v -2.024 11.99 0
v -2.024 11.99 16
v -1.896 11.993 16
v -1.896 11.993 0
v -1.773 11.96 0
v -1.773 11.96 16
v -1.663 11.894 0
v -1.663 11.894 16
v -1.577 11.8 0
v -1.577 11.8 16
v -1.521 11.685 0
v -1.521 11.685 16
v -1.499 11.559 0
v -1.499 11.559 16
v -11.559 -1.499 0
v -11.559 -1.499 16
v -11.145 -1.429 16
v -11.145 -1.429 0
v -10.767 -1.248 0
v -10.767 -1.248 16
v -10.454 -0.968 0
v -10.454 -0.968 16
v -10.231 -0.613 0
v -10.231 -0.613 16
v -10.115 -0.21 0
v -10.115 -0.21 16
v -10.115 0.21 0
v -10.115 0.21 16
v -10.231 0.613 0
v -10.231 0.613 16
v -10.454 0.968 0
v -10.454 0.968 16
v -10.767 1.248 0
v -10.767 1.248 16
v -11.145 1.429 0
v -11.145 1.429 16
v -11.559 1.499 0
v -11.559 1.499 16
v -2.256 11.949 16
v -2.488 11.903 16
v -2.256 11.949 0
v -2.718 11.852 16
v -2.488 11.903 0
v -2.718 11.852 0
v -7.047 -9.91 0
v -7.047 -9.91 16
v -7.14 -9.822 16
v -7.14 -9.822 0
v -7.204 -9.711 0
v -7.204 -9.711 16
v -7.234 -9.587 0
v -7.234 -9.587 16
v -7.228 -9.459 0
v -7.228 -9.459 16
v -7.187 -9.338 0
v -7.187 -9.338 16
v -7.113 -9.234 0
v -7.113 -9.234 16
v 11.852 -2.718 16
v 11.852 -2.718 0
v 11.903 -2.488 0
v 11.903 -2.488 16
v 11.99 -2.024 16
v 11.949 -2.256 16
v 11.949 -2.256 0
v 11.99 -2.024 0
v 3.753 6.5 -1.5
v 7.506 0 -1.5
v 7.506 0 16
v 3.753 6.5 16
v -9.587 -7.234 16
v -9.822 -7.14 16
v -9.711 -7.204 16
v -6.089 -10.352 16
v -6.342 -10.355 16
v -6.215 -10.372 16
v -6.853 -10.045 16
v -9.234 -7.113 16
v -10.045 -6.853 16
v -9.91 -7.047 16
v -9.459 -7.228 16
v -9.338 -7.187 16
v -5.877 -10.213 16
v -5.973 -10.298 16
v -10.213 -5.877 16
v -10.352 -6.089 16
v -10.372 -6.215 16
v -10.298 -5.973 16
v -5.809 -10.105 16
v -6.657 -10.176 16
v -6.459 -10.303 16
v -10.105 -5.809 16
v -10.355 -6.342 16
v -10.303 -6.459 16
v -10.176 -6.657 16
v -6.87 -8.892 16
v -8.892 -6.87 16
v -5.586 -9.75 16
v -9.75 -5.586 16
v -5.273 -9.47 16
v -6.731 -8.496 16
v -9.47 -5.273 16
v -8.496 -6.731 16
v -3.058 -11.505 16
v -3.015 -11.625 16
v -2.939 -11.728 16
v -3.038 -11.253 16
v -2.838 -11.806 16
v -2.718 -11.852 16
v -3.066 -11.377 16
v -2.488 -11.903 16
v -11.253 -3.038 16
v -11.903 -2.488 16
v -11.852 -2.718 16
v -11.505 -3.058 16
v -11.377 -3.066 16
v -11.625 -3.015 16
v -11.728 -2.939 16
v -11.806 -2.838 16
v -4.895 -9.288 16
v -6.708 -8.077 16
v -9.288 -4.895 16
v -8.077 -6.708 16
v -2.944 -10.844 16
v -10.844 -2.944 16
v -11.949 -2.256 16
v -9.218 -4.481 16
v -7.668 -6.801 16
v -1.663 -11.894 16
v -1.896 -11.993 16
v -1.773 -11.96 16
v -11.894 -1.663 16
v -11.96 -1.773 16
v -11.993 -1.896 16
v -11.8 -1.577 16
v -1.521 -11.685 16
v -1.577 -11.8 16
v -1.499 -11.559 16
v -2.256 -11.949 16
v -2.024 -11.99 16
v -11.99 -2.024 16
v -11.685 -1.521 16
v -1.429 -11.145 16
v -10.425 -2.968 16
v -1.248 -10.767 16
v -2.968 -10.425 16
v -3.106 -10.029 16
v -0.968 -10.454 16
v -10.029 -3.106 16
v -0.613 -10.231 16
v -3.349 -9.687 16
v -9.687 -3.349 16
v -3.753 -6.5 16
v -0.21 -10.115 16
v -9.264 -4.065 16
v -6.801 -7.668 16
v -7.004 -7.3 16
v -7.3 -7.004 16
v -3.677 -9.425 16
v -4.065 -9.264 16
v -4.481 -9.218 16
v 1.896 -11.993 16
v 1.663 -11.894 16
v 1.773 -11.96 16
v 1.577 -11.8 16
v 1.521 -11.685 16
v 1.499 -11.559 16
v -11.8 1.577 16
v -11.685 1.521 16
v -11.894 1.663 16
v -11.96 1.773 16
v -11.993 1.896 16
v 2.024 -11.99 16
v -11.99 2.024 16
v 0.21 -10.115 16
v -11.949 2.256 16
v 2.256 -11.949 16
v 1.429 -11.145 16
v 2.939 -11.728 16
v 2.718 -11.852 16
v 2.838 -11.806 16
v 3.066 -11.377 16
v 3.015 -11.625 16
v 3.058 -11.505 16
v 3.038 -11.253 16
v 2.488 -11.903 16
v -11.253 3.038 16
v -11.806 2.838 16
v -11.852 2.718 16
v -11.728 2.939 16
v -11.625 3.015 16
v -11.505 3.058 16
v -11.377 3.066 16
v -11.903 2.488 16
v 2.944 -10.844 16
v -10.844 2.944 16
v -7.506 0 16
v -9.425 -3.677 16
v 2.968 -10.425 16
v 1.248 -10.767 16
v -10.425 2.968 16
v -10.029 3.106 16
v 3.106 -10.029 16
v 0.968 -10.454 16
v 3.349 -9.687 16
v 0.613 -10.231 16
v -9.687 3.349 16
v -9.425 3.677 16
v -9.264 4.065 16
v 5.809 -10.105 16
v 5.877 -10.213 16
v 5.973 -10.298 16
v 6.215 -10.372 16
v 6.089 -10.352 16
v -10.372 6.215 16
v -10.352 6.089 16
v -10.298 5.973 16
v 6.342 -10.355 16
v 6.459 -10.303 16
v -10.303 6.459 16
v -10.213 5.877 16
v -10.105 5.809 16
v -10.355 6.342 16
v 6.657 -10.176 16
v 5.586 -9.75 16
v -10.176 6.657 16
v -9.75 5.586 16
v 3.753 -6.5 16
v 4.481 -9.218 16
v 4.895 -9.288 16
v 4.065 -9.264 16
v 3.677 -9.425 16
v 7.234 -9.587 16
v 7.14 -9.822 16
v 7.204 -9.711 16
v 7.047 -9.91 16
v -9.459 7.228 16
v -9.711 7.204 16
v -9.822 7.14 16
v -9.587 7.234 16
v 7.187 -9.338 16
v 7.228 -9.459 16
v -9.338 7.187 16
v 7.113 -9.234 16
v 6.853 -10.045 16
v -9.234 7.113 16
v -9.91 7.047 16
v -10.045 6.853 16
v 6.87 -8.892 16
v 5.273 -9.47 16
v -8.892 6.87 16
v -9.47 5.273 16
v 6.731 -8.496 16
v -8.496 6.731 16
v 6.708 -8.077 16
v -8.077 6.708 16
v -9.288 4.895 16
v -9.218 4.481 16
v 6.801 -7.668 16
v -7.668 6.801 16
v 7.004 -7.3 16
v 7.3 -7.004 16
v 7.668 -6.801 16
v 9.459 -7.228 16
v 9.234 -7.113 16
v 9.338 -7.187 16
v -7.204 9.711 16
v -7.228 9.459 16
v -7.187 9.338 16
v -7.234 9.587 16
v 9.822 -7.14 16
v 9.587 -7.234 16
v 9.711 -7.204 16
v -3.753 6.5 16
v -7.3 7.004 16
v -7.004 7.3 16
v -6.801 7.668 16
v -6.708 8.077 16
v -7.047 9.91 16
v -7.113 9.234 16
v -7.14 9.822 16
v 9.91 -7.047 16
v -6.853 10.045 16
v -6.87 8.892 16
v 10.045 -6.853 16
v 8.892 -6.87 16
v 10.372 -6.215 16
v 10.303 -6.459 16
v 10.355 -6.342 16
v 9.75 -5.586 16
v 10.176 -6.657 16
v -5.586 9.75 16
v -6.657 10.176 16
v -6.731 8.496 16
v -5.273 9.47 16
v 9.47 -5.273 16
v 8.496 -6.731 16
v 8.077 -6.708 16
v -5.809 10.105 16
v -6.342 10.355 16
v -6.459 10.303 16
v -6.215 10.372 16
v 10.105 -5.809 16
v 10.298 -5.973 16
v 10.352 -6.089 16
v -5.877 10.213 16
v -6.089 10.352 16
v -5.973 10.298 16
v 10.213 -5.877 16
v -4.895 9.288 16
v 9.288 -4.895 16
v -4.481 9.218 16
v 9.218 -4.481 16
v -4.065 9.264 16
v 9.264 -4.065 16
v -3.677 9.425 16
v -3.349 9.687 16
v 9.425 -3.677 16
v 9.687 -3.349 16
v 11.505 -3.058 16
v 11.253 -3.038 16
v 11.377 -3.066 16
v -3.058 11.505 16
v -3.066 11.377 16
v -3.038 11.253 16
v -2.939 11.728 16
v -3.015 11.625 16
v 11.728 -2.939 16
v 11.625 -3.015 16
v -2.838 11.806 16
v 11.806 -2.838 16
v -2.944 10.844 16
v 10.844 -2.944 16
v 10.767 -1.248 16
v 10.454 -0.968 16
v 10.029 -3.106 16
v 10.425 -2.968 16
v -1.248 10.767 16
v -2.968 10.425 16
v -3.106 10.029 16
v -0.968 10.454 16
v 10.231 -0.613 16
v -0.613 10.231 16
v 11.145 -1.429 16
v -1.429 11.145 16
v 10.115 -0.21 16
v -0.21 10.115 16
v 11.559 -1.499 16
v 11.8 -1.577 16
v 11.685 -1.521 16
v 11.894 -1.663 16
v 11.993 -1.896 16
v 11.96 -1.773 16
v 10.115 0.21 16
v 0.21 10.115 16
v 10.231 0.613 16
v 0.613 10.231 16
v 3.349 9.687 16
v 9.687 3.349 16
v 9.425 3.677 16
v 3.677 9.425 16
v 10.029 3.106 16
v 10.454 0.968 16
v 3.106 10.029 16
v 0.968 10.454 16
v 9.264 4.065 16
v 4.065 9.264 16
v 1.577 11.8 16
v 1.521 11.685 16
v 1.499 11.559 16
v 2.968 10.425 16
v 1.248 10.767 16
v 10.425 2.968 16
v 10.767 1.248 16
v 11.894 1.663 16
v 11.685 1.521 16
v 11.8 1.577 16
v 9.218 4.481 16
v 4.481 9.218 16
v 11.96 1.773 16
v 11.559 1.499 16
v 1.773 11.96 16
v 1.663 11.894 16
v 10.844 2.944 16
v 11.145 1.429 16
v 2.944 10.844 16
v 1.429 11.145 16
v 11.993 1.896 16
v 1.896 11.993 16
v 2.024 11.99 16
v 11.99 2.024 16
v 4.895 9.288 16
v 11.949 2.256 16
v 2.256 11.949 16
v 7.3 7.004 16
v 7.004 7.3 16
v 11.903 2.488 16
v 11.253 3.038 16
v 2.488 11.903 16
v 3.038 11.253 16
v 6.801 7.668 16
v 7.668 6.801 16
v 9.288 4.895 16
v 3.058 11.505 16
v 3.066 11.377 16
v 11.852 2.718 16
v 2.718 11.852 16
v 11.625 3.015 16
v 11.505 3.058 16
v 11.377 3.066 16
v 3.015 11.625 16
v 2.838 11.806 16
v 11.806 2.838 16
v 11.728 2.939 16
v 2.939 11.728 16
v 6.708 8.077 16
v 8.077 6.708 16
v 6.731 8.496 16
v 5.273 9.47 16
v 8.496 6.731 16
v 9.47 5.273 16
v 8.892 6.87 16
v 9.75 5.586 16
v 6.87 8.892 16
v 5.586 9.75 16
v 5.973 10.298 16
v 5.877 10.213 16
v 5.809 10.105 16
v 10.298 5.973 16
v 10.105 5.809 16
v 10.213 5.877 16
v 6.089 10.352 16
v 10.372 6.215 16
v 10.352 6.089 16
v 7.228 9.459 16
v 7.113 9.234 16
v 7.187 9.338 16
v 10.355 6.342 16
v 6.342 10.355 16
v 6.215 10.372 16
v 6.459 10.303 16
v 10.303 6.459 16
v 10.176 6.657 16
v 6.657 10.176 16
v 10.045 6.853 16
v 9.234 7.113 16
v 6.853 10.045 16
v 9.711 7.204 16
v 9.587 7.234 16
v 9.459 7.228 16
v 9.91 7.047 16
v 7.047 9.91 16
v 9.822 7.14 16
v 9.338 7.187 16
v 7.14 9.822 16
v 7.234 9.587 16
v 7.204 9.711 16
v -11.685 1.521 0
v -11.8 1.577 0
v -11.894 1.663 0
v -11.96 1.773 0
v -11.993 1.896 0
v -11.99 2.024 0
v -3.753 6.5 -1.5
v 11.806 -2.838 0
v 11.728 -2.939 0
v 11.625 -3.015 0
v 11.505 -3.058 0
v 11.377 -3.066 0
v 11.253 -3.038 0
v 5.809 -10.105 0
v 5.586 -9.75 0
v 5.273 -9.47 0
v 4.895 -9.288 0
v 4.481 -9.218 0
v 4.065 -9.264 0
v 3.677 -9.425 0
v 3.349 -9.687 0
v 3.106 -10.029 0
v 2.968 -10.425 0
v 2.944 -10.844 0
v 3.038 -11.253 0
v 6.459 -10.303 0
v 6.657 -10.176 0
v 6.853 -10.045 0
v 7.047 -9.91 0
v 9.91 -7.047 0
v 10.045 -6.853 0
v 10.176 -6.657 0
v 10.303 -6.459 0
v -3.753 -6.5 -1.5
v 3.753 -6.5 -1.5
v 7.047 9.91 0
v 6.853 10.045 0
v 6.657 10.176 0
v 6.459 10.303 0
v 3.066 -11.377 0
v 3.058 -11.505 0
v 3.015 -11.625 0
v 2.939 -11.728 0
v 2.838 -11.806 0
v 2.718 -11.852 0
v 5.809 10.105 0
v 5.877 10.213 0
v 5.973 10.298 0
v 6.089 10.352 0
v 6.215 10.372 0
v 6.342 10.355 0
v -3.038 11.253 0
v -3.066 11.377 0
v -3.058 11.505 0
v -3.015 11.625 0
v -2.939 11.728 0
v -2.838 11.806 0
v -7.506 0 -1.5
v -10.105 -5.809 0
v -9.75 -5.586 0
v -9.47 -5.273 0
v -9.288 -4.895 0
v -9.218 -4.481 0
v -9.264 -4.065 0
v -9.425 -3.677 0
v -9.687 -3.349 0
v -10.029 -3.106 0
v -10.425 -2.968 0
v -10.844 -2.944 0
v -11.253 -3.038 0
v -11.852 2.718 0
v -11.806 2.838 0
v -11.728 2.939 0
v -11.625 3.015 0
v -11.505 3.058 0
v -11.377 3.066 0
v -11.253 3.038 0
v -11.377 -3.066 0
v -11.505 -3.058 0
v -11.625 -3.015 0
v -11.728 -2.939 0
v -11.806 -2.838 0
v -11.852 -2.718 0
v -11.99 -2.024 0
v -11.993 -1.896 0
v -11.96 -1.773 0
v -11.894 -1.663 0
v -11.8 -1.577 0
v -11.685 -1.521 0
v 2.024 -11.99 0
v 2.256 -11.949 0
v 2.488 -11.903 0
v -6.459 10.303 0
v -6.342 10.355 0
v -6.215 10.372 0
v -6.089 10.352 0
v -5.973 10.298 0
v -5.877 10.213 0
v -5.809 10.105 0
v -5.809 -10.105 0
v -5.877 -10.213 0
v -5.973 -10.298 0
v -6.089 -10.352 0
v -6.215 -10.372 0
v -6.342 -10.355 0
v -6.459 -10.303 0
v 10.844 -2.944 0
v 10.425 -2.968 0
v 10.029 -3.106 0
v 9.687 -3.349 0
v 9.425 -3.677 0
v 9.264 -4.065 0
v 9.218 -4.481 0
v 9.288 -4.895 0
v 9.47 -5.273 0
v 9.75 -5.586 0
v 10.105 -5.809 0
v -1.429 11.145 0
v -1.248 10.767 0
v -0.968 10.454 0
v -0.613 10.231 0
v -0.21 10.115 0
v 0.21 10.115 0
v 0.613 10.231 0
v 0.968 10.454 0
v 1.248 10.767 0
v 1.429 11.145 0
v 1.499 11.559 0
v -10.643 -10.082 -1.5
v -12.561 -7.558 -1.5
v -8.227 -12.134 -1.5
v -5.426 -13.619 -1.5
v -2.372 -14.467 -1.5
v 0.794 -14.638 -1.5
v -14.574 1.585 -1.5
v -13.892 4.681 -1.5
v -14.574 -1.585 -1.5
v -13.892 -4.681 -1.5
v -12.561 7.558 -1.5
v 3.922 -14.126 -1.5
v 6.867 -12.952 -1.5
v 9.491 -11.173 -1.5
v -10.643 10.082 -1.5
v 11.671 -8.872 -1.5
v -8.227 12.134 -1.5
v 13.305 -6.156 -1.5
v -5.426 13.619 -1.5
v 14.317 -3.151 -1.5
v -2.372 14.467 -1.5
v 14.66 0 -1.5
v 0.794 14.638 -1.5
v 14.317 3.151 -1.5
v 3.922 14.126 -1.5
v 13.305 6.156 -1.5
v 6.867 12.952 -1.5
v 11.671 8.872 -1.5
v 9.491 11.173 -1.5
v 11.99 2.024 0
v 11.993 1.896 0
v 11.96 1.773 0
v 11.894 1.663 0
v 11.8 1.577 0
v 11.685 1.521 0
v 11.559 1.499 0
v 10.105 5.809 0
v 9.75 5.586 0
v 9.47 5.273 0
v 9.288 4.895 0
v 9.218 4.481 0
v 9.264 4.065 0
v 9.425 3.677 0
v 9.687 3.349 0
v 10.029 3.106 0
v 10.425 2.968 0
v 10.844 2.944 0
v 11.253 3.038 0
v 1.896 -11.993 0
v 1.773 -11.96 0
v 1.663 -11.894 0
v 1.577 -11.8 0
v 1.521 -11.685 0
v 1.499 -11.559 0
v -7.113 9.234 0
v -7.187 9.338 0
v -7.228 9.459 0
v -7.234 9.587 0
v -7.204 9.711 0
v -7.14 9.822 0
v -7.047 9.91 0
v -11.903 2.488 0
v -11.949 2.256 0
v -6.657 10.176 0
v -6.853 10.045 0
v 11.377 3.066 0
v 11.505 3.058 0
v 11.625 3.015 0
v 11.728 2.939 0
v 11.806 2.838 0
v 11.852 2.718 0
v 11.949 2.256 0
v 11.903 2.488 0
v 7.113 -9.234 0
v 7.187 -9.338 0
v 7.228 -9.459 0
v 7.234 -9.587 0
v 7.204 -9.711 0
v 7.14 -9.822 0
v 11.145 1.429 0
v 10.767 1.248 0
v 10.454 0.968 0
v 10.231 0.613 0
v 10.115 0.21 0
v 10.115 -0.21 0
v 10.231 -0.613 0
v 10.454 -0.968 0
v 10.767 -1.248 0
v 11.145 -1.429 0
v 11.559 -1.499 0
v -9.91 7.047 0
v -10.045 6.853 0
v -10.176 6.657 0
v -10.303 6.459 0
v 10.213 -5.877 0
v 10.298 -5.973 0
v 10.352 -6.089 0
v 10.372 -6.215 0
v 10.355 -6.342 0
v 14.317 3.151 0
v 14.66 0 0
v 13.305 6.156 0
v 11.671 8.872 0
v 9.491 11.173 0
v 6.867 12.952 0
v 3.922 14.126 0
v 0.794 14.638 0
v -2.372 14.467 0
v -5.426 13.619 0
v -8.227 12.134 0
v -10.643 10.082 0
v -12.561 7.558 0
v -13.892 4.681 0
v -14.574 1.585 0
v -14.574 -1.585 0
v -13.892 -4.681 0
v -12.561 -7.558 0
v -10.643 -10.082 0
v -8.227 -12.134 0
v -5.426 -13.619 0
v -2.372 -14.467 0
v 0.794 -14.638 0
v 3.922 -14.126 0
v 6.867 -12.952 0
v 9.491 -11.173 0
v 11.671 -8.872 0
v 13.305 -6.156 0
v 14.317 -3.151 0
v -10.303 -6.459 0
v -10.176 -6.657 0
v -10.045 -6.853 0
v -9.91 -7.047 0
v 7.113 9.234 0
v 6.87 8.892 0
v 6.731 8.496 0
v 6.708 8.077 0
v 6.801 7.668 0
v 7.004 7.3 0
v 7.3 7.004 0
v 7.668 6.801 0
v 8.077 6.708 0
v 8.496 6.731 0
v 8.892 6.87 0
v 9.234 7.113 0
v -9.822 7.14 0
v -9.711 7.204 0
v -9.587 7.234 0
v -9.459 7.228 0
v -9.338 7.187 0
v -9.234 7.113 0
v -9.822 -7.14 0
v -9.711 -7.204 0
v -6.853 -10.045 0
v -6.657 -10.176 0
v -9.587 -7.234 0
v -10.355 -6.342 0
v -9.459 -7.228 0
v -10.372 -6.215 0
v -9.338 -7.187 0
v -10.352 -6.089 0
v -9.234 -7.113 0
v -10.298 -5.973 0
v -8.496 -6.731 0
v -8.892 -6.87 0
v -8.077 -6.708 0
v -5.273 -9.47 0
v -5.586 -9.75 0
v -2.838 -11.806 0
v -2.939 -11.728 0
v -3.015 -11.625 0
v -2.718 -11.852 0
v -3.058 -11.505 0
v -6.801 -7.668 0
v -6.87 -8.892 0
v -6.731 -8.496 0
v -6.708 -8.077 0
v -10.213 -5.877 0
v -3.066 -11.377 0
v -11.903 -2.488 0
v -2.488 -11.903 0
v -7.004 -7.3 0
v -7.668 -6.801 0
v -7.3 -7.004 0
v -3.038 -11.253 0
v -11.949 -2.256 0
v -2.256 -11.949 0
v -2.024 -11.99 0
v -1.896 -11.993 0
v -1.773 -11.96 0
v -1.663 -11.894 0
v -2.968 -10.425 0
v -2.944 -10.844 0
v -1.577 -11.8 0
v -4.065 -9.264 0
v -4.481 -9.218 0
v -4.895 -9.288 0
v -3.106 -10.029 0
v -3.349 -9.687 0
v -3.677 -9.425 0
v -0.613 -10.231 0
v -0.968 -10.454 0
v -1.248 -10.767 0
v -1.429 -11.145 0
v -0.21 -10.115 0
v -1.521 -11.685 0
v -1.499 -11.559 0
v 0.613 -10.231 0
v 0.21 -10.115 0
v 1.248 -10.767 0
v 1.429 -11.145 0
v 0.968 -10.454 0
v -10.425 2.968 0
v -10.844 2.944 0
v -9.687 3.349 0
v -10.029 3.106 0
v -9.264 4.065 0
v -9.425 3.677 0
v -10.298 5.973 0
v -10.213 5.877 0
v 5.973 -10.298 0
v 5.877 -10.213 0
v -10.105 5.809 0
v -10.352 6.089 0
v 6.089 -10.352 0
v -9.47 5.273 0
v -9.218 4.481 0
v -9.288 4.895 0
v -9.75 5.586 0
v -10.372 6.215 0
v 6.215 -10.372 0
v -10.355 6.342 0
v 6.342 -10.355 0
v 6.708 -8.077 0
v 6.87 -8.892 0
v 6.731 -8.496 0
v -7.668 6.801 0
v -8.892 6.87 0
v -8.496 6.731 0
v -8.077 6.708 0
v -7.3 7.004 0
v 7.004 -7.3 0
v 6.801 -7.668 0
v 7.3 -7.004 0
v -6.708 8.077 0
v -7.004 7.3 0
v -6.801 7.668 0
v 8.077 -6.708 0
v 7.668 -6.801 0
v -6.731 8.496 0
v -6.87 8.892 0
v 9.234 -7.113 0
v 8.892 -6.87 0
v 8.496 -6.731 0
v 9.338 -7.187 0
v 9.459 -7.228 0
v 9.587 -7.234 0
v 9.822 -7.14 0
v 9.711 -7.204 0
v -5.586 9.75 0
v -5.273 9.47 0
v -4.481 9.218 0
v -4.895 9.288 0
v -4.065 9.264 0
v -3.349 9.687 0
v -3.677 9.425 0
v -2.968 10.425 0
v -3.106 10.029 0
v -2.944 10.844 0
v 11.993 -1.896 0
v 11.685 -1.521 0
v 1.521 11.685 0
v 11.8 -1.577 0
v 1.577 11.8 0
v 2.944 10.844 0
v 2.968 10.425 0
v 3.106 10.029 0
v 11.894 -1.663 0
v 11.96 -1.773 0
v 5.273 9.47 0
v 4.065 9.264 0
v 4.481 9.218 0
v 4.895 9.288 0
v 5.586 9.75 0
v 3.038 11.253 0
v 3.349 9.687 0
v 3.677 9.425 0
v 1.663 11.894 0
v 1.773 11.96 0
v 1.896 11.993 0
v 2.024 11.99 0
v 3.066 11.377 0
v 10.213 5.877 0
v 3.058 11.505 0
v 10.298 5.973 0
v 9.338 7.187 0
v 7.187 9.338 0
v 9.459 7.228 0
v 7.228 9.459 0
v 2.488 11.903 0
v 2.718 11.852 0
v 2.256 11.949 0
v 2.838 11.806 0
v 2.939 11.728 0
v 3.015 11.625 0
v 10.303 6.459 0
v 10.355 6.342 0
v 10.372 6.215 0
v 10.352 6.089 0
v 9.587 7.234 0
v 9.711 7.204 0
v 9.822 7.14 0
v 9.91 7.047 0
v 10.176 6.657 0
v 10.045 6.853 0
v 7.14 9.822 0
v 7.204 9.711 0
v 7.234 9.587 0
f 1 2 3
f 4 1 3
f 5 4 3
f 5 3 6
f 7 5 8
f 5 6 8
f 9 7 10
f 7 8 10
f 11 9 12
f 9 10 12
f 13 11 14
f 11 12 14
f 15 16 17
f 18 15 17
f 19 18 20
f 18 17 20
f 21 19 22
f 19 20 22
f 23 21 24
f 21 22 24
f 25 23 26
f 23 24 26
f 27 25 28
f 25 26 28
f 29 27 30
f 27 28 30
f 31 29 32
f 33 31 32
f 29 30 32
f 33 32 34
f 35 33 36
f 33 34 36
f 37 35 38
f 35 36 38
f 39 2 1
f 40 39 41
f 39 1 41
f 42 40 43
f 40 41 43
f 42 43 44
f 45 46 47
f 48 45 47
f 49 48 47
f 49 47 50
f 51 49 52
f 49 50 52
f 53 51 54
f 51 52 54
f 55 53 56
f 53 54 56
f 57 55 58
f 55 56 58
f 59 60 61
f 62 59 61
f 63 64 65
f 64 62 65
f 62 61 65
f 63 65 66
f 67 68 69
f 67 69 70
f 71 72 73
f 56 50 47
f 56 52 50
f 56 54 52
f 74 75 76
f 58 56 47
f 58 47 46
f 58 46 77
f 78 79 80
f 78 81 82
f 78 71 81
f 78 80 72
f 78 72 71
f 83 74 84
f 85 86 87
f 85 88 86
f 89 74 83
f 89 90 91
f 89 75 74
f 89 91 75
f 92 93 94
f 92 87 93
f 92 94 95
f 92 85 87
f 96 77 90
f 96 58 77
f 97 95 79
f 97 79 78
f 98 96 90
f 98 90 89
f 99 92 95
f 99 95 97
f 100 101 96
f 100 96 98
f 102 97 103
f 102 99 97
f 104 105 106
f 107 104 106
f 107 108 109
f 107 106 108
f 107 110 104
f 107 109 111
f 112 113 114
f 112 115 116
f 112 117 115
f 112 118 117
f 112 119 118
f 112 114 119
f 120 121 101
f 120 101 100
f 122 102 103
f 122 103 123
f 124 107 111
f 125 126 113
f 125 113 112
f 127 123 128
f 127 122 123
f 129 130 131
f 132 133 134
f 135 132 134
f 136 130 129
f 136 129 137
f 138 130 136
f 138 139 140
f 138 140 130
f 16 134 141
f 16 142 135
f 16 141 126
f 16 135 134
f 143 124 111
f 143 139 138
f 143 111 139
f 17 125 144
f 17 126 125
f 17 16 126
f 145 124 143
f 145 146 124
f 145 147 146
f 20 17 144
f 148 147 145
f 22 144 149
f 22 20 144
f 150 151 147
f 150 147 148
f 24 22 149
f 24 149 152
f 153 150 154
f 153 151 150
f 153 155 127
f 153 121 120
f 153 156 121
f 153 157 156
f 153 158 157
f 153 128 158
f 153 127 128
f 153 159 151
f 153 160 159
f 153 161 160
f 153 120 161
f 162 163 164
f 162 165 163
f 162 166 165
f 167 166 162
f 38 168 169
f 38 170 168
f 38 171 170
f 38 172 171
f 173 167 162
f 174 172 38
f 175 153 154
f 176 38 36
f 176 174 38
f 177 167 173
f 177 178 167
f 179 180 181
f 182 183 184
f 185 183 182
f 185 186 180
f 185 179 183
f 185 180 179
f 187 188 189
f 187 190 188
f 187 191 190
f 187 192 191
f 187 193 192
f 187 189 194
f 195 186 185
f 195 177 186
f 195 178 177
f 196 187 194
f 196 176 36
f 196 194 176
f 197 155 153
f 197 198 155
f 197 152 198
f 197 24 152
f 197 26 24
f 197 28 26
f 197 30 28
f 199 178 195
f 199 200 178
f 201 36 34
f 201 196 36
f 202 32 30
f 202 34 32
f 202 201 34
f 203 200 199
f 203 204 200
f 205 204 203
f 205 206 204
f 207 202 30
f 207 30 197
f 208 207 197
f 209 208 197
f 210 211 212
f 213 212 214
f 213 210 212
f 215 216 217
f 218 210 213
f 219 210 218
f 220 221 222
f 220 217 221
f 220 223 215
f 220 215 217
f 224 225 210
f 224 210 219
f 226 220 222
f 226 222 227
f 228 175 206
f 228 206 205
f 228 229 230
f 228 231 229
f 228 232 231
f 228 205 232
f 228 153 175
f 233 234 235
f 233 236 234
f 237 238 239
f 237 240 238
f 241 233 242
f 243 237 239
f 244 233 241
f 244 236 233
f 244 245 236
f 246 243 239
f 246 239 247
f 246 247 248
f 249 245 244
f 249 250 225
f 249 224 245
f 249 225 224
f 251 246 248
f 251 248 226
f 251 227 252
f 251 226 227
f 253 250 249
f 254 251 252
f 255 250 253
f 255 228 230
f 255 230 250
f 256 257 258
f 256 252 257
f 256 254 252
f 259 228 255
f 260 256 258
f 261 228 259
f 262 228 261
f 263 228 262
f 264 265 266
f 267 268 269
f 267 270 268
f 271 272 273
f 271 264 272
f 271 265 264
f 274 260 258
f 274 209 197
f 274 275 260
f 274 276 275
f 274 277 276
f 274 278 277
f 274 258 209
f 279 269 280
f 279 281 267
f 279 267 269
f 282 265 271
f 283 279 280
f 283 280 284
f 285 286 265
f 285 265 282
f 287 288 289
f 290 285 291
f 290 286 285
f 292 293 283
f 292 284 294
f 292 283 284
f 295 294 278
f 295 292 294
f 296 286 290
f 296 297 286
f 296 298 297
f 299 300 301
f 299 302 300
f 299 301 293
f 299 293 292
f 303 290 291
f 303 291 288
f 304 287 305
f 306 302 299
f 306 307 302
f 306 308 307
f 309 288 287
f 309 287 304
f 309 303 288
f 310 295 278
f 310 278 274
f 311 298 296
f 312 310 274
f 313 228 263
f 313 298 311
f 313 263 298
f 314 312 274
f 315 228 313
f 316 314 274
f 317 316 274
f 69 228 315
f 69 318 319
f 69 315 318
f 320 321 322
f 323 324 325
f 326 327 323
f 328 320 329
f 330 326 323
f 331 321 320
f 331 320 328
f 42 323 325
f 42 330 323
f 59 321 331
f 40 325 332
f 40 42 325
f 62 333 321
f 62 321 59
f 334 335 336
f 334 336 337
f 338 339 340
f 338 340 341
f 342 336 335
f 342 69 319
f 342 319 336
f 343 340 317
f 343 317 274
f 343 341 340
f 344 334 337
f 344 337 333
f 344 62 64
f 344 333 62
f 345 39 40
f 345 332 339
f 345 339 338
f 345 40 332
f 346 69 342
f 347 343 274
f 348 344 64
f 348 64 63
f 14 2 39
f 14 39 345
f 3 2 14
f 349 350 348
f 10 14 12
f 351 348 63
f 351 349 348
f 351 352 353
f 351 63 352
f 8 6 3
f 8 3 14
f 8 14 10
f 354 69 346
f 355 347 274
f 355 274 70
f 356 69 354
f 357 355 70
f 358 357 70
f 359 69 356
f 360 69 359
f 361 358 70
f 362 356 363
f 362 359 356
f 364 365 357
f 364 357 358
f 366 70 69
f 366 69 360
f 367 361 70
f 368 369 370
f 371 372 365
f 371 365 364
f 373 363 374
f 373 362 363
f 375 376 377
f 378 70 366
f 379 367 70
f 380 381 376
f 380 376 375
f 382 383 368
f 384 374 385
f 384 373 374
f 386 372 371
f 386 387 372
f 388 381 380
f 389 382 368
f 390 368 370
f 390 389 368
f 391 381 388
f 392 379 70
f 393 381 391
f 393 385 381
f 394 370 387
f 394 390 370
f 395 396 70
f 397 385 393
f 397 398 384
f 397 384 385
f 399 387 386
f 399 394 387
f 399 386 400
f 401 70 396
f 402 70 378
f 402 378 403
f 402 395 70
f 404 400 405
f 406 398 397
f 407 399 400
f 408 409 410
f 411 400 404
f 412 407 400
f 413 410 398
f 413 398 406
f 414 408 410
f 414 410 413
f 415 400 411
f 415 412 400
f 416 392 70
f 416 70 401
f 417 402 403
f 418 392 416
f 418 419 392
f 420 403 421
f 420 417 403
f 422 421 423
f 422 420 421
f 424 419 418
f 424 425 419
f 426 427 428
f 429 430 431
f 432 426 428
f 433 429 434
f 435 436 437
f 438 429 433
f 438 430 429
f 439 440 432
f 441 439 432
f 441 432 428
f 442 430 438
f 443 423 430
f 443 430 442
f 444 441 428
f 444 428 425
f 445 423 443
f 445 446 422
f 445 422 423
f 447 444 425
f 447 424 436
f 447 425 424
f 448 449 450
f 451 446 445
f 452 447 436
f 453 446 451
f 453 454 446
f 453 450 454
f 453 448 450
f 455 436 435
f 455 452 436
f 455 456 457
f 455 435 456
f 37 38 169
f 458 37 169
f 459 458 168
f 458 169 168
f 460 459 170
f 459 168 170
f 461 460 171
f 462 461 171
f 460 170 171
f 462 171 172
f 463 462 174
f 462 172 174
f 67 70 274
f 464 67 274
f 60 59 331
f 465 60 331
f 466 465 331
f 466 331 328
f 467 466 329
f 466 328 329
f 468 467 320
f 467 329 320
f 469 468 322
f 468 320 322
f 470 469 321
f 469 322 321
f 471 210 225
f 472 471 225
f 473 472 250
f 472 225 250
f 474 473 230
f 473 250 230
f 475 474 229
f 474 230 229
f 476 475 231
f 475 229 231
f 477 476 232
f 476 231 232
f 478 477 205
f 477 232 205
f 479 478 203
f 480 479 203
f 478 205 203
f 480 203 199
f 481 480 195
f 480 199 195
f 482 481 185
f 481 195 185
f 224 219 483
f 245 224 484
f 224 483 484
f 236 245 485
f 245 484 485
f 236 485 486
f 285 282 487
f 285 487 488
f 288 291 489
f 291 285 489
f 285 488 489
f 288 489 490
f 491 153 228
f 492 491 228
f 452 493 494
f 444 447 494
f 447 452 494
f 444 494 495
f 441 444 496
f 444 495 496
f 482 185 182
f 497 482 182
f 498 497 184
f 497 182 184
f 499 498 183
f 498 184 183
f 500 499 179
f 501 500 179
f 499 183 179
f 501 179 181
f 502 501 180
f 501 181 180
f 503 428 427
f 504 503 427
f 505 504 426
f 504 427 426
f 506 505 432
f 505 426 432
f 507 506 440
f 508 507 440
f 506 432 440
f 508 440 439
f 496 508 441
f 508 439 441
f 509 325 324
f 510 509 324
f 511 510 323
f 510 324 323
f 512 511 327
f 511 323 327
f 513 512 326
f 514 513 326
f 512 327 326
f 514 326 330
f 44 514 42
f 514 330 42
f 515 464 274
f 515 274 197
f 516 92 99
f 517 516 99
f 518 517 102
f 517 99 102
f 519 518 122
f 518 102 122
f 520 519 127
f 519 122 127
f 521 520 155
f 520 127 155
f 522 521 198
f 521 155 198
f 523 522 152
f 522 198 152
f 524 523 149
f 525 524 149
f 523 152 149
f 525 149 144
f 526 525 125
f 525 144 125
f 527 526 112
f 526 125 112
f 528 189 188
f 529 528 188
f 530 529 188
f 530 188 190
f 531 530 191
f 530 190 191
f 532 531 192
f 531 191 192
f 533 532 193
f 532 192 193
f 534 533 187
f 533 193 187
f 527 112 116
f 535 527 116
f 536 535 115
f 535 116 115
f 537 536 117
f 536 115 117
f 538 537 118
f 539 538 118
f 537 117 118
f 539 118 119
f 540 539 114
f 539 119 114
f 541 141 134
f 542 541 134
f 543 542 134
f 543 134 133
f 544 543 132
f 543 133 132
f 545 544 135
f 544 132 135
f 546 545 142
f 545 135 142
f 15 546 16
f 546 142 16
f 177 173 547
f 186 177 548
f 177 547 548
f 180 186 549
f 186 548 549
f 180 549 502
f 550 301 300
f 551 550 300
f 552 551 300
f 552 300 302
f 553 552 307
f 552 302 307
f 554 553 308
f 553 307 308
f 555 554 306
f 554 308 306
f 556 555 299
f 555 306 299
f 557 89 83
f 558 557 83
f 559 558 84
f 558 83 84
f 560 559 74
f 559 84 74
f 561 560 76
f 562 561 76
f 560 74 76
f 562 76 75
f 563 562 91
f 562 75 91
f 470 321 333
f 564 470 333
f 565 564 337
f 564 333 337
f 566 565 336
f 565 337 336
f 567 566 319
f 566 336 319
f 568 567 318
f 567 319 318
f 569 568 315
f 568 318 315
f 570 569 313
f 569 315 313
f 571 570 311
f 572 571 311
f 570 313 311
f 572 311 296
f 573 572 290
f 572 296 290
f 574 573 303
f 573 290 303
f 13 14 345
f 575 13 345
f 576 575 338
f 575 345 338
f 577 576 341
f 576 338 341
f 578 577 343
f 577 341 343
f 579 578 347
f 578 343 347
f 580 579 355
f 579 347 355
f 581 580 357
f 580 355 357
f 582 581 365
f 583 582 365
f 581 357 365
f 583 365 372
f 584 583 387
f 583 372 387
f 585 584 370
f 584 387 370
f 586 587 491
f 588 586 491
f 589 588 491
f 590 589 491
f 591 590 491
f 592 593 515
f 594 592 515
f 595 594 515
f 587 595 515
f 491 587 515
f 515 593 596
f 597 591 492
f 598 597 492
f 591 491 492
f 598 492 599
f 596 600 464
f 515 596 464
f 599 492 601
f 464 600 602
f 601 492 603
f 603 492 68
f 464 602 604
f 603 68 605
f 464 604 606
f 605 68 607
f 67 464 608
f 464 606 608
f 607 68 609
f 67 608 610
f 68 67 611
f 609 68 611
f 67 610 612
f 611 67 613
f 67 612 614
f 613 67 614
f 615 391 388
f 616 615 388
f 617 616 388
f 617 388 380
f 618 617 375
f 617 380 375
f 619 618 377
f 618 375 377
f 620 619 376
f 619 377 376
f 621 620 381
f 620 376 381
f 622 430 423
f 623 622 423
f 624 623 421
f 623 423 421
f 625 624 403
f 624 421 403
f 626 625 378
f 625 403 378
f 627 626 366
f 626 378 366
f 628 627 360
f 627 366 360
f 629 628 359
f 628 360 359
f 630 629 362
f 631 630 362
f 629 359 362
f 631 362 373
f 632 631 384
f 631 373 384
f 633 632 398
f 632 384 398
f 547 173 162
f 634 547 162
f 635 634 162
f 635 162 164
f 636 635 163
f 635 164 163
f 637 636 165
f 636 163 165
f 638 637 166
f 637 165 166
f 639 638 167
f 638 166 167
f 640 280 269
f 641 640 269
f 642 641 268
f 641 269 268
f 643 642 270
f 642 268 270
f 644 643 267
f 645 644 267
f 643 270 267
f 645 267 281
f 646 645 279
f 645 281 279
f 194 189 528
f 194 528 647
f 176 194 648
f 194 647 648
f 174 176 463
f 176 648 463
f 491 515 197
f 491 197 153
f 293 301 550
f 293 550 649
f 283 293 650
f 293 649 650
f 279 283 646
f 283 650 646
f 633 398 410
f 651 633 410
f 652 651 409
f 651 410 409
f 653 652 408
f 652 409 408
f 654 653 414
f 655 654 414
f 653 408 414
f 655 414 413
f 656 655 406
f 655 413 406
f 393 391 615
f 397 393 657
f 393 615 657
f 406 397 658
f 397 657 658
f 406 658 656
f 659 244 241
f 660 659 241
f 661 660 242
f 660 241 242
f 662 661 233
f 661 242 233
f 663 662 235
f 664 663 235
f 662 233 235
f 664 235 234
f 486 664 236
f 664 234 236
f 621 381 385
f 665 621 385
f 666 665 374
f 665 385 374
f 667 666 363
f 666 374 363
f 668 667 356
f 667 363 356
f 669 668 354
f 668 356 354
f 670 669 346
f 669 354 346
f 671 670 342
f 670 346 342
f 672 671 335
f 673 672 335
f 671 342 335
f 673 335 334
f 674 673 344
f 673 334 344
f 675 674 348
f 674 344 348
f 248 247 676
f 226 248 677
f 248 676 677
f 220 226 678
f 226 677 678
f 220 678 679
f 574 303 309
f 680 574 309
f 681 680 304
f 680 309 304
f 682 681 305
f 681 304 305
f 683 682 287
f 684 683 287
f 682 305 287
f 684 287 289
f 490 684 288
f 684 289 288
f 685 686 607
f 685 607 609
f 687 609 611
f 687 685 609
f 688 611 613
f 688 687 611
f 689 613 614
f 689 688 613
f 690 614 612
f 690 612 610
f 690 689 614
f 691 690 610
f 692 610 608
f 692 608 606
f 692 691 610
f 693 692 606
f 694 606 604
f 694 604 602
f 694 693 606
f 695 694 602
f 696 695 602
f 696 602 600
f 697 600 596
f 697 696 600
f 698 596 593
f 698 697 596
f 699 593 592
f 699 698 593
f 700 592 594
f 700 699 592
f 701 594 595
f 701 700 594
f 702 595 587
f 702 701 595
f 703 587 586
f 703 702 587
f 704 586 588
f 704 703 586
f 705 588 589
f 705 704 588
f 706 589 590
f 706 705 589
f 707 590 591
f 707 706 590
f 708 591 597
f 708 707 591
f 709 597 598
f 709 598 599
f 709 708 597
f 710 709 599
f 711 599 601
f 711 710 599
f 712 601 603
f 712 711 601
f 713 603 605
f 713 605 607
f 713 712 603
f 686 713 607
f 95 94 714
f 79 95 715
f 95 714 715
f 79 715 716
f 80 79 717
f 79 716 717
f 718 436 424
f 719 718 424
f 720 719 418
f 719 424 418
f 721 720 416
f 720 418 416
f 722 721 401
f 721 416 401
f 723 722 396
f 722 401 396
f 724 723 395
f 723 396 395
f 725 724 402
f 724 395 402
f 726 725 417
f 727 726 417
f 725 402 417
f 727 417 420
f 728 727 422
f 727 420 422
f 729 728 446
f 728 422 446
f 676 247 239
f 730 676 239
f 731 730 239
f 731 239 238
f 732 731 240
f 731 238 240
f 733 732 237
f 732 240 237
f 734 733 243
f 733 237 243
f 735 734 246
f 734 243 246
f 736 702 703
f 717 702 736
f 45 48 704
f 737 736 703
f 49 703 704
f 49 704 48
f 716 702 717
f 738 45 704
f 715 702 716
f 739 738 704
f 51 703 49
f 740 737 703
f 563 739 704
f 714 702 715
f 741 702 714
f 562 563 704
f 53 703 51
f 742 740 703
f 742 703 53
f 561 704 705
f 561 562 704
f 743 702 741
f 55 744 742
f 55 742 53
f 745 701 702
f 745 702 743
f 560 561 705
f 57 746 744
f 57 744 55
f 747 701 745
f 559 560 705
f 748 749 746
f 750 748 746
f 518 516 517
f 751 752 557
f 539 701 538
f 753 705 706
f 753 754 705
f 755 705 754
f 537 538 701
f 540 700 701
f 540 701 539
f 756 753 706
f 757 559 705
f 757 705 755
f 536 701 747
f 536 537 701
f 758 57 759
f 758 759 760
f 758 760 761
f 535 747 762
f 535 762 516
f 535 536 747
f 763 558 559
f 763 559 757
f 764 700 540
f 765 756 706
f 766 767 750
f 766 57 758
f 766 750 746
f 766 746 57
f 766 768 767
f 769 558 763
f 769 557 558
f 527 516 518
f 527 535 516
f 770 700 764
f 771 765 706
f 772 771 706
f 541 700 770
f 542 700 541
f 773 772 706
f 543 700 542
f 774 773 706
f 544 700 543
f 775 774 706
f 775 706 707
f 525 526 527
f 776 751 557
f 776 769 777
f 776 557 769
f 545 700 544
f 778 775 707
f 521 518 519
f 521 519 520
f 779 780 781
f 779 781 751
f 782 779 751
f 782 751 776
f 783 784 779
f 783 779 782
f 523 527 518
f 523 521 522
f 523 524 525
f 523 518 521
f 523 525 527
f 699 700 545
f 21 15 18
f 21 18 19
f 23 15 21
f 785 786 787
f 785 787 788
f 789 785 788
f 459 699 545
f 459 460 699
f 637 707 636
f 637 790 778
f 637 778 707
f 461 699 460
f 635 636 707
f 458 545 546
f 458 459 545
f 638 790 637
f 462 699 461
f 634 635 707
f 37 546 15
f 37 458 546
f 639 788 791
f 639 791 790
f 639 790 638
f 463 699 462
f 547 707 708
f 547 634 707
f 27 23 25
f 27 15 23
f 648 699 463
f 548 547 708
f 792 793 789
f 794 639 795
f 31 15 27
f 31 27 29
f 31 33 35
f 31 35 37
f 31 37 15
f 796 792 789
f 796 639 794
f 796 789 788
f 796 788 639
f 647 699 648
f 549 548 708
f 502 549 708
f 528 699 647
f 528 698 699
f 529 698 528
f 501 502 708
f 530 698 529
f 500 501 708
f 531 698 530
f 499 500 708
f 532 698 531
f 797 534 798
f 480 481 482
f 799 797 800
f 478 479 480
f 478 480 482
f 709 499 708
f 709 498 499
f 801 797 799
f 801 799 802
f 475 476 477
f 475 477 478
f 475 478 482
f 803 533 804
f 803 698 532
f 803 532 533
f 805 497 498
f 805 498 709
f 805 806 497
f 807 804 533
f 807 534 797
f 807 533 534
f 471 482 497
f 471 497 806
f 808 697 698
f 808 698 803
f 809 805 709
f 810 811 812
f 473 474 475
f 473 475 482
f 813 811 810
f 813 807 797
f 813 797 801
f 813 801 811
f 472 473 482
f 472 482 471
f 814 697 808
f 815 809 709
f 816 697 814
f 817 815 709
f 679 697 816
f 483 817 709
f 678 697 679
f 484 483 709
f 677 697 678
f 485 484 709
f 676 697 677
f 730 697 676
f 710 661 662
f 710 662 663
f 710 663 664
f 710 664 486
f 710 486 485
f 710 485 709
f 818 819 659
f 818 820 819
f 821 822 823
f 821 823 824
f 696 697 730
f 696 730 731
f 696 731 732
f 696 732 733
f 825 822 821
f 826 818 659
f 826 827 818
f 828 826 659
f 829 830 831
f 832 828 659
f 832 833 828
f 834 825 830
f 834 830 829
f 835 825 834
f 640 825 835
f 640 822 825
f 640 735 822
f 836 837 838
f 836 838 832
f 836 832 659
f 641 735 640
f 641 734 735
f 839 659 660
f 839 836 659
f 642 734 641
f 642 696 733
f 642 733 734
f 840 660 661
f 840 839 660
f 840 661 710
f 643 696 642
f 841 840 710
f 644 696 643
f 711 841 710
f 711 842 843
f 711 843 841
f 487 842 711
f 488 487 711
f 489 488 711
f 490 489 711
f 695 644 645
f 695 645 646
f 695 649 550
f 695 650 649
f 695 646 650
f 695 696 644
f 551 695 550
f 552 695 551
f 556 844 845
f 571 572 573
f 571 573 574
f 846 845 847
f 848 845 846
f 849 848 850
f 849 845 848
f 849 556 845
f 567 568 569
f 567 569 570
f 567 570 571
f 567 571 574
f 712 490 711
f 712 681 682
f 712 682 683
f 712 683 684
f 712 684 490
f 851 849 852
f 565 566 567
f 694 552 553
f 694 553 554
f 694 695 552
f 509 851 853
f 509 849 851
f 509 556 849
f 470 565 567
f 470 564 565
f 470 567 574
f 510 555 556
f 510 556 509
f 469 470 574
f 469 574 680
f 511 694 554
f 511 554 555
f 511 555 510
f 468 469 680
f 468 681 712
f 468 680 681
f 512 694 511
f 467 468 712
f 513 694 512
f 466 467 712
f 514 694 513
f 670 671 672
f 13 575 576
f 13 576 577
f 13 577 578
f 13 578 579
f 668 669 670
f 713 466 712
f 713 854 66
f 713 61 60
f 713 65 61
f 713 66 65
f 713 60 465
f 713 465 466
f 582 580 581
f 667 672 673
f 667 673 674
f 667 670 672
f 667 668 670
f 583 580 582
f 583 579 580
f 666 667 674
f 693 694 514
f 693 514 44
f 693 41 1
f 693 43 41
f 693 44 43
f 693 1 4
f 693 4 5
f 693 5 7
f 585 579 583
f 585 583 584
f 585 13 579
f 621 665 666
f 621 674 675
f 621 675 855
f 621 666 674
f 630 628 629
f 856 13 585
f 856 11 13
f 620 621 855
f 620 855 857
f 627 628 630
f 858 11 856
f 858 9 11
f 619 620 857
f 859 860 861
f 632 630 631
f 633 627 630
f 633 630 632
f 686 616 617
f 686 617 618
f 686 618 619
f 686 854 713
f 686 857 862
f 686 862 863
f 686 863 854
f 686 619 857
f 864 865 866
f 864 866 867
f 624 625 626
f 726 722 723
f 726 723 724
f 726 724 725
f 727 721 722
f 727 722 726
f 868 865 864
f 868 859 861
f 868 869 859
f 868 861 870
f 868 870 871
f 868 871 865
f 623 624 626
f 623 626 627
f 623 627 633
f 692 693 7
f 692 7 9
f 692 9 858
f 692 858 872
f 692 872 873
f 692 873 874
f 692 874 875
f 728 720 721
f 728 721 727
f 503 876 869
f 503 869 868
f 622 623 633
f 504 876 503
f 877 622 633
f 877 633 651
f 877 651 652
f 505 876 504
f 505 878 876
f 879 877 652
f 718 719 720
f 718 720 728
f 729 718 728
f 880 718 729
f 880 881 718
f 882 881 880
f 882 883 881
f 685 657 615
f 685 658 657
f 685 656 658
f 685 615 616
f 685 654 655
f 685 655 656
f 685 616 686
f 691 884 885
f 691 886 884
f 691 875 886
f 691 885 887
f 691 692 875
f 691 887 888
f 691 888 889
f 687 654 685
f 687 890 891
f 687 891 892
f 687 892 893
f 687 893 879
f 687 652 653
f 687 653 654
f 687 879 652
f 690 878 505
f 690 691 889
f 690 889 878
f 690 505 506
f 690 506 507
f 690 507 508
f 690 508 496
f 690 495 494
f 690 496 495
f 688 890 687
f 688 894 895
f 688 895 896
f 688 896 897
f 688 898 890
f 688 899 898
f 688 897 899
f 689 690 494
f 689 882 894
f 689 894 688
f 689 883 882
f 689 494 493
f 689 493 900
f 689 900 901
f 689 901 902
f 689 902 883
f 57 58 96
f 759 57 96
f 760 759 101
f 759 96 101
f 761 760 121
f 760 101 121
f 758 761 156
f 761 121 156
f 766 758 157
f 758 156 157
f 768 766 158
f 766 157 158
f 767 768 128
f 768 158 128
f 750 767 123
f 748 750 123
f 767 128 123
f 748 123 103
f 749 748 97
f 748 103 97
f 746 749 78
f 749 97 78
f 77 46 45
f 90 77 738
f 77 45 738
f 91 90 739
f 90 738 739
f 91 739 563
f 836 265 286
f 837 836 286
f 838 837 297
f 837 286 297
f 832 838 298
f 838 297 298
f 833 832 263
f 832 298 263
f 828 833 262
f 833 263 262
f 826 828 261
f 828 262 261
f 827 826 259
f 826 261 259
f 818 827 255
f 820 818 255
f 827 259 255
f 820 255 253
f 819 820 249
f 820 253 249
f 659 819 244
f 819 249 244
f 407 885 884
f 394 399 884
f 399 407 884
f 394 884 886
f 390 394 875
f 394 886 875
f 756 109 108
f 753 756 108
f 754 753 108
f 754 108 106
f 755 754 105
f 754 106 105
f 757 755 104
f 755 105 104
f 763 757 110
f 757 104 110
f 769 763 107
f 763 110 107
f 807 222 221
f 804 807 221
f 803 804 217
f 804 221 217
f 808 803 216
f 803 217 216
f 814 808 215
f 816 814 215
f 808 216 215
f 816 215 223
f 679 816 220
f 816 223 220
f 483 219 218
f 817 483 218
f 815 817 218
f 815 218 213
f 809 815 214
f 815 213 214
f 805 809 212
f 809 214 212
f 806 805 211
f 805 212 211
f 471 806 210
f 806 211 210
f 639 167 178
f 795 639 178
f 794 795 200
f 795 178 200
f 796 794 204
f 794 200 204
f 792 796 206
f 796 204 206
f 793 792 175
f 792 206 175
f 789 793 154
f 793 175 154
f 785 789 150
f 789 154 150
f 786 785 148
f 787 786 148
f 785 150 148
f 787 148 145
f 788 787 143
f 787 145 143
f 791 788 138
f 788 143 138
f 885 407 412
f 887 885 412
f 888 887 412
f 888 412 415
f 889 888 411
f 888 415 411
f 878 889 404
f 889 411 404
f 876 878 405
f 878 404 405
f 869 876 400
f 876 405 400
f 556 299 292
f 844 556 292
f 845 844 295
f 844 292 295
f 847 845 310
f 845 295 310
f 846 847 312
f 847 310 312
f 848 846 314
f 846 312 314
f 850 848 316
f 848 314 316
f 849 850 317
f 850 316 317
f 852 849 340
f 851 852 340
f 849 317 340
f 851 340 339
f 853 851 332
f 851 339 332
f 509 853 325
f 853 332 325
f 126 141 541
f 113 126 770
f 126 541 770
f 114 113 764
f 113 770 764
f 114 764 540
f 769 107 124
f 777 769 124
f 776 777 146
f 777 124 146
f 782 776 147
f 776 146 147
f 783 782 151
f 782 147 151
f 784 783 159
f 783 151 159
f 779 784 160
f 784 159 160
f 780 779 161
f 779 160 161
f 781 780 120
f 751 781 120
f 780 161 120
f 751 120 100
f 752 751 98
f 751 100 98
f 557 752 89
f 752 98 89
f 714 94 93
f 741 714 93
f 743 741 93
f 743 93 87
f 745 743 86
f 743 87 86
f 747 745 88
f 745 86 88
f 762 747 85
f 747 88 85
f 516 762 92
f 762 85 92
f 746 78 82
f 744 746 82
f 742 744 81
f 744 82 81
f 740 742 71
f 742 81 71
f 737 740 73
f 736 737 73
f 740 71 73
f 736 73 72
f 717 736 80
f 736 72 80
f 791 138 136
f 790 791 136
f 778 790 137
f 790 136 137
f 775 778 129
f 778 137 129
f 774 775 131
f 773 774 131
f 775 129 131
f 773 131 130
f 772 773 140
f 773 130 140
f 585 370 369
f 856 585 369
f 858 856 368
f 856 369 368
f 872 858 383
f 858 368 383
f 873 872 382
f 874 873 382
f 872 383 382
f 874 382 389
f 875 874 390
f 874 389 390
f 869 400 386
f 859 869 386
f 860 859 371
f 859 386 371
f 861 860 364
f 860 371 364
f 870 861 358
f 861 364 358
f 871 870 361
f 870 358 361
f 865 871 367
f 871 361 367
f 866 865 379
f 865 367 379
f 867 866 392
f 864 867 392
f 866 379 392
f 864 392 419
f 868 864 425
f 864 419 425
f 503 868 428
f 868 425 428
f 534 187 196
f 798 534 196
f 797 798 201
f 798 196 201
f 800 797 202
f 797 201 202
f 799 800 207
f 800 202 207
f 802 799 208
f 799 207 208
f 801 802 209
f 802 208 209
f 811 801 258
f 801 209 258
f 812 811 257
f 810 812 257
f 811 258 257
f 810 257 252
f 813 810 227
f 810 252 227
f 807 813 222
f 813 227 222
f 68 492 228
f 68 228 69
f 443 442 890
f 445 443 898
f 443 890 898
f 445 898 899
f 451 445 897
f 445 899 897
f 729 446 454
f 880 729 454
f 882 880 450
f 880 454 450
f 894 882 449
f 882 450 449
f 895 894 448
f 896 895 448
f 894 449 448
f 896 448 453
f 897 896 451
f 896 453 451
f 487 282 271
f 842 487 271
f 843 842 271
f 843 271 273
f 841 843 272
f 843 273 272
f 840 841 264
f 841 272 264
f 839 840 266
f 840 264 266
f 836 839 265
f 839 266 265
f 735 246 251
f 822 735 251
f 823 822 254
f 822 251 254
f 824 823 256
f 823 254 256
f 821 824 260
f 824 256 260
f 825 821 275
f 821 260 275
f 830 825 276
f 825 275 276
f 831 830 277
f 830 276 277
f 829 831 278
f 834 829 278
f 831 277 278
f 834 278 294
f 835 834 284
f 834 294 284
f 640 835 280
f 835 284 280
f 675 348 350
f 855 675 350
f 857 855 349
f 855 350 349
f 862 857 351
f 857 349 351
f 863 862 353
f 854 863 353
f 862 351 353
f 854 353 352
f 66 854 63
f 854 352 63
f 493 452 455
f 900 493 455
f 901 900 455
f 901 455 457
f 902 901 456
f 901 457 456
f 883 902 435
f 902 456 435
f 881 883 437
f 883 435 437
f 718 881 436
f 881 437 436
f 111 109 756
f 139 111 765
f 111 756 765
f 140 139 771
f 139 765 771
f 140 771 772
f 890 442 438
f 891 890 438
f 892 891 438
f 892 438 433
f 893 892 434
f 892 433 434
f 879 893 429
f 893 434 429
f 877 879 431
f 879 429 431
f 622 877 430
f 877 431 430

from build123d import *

# Parameters (mm, degrees)
F2_R            = 12.1598954619
F3_DEPTH        = 16
F5_DEPTH        = 16
F5_COPIES_COUNT = 16
F8_R            = 14.6598954619
F8_R_2          = 12.1598954619
F9_DEPTH        = 1.5
F10_DEPTH       = 17.501


# Not quite as in the source:
# - a feature of the source that left no trace in its solid (it failed there, or was rolled back) is left out
# - a pattern or mirror of a feature is missing from the dataset's text; its kind, count and spacing are read off the source's solid


with BuildPart() as f3:
    # F2 (on Top) → F3 (new body)
    with BuildSketch(Plane.XY):
        Circle(F2_R)
    extrude(amount=F3_DEPTH)

    # F4 (on face) → F5 (cut, through all)
    with BuildSketch(Plane.XY.offset(16)):
        with BuildLine():
            ThreePointArc((-2.024177758, 11.9902361131), (-1.6634915573, 11.8941223999), (-1.4994378615, 11.5588333213))
            ThreePointArc((-1.4994378615, 11.5588333213), (0, 10.0998954619), (1.4994378615, 11.5588333213))
            ThreePointArc((1.4994378615, 11.5588333213), (1.6634915573, 11.8941223999), (2.024177758, 11.9902361131))
            ThreePointArc((2.024177758, 11.9902361131), (0, 12.1598954619), (-2.024177758, 11.9902361131))
        make_face()
    f5 = extrude(amount=-F5_DEPTH, mode=Mode.SUBTRACT)

    # F5_copies: F5 ×16 about axis
    f5_copies_axis = Axis((0, 0, 0), (0, 0, 1))
    for i in range(1, F5_COPIES_COUNT):
        add(f5.rotate(f5_copies_axis, i * 360 / F5_COPIES_COUNT), mode=Mode.SUBTRACT)

    # F8 (on face) + F2 (on Top) → F9 (join)
    with BuildSketch(Plane.XY):
        Circle(F8_R)
        Circle(F8_R_2, mode=Mode.SUBTRACT)
    with BuildSketch(Plane.XY):
        Circle(F2_R)
    extrude(amount=-F9_DEPTH)

    # F7 (on face) → F10 (cut, through all)
    with BuildSketch(Plane.XY.offset(16)):
        Polygon((3.7527767497, 6.5), (-3.7527767497, 6.5), (-7.5055534995, 0), (-3.7527767497, -6.5), (3.7527767497, -6.5), (7.5055534995, 0), align=None)
    extrude(amount=-F10_DEPTH, mode=Mode.SUBTRACT)


solid = f3.part
